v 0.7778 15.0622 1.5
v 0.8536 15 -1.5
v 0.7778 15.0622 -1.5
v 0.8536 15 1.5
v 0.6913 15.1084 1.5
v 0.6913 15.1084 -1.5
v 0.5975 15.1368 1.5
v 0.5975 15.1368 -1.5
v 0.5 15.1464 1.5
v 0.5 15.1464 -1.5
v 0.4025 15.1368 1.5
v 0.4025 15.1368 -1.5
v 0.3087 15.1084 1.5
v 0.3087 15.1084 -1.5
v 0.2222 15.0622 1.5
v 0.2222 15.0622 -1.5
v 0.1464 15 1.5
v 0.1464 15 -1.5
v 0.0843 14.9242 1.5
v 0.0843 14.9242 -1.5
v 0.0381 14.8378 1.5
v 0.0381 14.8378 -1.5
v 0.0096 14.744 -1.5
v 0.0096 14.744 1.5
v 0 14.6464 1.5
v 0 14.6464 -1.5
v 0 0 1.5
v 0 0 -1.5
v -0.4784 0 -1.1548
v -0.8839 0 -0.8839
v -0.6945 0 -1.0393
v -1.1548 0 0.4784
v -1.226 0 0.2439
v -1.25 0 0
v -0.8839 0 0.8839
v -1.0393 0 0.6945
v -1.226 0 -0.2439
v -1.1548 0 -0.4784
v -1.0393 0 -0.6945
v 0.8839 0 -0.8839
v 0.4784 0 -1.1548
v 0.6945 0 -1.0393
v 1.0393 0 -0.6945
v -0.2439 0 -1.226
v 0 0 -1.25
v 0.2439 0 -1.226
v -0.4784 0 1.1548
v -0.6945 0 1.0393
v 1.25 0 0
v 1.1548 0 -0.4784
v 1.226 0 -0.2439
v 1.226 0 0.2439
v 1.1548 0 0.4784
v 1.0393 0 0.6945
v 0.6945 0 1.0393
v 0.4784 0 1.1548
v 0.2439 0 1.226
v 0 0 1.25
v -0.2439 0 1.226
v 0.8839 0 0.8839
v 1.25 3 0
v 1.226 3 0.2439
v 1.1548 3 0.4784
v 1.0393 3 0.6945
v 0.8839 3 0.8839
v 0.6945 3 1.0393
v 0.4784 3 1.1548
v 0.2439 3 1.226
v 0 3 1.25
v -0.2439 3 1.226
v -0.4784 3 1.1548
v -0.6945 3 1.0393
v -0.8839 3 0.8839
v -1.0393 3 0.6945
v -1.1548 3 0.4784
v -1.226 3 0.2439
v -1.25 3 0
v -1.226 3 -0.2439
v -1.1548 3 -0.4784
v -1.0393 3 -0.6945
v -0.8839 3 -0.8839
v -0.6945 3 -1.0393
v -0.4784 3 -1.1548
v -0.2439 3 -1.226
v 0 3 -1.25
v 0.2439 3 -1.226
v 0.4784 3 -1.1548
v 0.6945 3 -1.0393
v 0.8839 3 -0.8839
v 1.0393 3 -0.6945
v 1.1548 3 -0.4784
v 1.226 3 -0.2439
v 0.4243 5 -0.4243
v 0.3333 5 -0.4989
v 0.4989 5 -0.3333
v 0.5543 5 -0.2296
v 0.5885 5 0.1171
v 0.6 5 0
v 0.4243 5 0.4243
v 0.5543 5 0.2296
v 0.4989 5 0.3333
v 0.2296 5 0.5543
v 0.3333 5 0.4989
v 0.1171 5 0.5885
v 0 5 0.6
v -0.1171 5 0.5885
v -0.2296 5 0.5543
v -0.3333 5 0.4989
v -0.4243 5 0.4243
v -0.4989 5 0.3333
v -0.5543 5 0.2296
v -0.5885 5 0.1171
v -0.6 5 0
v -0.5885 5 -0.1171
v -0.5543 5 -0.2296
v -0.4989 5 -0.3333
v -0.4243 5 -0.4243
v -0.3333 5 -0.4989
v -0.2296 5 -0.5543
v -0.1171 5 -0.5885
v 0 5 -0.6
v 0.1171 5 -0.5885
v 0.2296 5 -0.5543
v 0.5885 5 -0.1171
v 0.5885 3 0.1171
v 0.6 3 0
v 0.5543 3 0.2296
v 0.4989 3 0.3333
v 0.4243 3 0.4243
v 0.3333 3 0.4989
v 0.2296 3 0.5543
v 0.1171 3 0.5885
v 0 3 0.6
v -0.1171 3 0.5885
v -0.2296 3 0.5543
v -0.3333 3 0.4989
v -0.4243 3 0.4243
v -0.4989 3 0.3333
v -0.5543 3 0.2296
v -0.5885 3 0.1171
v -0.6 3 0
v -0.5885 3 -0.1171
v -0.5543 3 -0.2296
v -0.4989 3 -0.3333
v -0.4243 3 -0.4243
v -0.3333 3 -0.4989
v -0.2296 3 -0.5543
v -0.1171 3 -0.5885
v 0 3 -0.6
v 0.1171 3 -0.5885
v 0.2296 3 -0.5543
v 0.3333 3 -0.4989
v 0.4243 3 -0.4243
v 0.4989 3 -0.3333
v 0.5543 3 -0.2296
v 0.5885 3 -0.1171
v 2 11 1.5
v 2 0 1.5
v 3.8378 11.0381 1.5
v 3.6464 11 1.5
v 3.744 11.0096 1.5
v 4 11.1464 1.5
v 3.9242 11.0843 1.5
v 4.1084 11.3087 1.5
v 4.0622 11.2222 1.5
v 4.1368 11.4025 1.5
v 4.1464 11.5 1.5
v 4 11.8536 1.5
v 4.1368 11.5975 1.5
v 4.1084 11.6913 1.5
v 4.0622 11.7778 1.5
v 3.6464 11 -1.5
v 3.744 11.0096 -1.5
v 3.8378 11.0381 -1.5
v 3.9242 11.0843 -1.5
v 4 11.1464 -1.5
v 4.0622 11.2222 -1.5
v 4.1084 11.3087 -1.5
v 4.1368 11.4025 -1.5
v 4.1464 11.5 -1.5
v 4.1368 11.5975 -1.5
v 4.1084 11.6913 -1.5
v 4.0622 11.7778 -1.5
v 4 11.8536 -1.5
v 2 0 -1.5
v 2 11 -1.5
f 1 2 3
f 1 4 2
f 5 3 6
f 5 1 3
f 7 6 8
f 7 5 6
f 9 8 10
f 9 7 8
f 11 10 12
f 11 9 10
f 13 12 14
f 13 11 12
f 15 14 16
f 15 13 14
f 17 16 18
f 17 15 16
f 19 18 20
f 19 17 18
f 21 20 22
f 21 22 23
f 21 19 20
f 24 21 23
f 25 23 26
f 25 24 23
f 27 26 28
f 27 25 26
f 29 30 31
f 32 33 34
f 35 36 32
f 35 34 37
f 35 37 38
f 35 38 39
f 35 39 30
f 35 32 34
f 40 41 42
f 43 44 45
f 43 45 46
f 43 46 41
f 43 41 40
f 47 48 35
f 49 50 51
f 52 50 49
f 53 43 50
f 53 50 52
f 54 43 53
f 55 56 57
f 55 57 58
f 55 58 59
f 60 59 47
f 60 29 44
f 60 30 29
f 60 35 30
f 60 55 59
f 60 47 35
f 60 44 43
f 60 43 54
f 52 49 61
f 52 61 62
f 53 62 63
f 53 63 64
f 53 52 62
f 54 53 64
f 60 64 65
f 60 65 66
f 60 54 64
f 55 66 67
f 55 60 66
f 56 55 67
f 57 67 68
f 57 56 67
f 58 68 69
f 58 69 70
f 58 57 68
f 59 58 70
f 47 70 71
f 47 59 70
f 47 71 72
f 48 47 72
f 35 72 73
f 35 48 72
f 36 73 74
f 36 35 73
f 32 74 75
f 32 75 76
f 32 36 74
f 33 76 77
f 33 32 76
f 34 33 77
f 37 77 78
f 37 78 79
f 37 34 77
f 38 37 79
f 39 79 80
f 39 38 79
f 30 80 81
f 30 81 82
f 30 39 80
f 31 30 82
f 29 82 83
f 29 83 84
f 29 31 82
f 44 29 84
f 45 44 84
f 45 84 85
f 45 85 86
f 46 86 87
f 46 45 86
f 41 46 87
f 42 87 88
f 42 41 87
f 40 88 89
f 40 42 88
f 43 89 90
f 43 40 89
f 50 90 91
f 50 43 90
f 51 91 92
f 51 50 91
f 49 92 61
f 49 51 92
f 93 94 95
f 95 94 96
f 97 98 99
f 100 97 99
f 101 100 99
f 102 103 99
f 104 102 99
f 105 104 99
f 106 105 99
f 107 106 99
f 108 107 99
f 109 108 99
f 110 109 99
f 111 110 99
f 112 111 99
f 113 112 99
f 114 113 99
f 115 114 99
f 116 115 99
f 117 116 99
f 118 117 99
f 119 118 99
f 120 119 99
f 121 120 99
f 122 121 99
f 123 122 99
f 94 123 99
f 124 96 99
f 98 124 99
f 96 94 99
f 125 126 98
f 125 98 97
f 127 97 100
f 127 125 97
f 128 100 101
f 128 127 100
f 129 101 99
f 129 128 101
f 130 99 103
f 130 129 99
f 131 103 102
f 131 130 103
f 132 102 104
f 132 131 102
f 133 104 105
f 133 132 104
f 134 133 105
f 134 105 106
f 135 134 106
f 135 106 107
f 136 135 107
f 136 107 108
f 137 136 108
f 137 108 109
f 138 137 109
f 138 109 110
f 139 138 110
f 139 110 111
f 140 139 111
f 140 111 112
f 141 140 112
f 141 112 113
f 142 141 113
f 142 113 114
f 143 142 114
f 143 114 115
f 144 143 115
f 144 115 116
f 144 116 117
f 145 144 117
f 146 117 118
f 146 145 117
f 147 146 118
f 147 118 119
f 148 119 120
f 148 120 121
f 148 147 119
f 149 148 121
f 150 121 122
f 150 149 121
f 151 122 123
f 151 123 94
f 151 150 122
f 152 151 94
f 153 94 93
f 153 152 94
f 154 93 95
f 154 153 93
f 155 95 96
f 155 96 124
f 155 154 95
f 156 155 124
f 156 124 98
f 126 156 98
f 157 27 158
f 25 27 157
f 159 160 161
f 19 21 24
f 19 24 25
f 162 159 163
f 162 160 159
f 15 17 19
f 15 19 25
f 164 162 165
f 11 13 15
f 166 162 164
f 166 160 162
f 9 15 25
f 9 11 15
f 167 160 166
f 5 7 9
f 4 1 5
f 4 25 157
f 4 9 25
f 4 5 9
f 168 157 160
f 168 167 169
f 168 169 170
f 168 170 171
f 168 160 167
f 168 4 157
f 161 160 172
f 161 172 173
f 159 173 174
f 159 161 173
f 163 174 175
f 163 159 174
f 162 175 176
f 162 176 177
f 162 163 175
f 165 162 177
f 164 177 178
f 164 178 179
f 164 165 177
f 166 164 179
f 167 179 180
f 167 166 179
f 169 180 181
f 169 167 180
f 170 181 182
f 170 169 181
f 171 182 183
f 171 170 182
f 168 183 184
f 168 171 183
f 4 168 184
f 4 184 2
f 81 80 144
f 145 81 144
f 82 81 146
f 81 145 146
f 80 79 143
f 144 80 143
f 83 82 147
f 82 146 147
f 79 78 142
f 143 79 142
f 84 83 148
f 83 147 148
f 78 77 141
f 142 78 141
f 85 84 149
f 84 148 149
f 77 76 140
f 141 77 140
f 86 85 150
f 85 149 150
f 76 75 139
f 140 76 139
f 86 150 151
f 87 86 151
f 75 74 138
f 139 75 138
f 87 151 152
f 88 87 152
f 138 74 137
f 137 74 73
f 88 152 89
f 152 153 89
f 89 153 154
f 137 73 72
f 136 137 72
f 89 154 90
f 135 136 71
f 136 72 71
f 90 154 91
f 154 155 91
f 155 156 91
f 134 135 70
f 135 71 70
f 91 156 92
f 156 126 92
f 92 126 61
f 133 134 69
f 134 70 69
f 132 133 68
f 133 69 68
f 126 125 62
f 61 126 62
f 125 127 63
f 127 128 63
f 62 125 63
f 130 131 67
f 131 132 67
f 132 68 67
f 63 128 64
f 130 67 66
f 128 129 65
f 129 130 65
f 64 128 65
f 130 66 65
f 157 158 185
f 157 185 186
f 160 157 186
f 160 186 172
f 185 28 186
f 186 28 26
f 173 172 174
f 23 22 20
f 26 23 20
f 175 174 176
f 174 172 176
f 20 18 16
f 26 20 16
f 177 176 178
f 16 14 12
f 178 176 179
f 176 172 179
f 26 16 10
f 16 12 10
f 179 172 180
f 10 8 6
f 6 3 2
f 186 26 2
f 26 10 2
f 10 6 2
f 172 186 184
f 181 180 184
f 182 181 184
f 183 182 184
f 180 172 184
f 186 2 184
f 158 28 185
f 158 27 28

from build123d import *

# Parameters (mm, degrees)
F2_DEPTH = 1.5
F1_R     = 0.6
F3_DEPTH = 5
F1_R_2   = 1.25
F4_DEPTH = 3


with BuildPart() as f2:
    # F0 (on Top) → F2 (new body, symmetric)
    with BuildSketch(Plane.XY):
        with BuildLine():
            Line((0, 11), (0, 0))
            Line((0, 0), (2, 0))
            Line((2, 0), (2, 11))
            Line((2, 11), (3.6464466094, 11))
            ThreePointArc((3.6464466094, 11), (4.1083863757, 11.3086582838), (4, 11.8535533906))
            Line((4, 11.8535533906), (0.8535533906, 15))
            ThreePointArc((0.8535533906, 15), (0.3086582838, 15.1083863757), (0, 14.6464466094))
            Line((0, 14.6464466094), (0, 11))
        make_face()
    extrude(amount=F2_DEPTH, both=True)


with BuildPart() as f3:
    # F1 (on Front) → F3 (new body)
    with BuildSketch(Plane.XZ):
        Circle(F1_R)
    extrude(amount=-F3_DEPTH)

    # F1 (on Front) → F4 (join)
    with BuildSketch(Plane.XZ):
        Circle(F1_R_2)
        Circle(F1_R, mode=Mode.SUBTRACT)
    extrude(amount=-F4_DEPTH)


solid = Compound([f2.part, f3.part])
